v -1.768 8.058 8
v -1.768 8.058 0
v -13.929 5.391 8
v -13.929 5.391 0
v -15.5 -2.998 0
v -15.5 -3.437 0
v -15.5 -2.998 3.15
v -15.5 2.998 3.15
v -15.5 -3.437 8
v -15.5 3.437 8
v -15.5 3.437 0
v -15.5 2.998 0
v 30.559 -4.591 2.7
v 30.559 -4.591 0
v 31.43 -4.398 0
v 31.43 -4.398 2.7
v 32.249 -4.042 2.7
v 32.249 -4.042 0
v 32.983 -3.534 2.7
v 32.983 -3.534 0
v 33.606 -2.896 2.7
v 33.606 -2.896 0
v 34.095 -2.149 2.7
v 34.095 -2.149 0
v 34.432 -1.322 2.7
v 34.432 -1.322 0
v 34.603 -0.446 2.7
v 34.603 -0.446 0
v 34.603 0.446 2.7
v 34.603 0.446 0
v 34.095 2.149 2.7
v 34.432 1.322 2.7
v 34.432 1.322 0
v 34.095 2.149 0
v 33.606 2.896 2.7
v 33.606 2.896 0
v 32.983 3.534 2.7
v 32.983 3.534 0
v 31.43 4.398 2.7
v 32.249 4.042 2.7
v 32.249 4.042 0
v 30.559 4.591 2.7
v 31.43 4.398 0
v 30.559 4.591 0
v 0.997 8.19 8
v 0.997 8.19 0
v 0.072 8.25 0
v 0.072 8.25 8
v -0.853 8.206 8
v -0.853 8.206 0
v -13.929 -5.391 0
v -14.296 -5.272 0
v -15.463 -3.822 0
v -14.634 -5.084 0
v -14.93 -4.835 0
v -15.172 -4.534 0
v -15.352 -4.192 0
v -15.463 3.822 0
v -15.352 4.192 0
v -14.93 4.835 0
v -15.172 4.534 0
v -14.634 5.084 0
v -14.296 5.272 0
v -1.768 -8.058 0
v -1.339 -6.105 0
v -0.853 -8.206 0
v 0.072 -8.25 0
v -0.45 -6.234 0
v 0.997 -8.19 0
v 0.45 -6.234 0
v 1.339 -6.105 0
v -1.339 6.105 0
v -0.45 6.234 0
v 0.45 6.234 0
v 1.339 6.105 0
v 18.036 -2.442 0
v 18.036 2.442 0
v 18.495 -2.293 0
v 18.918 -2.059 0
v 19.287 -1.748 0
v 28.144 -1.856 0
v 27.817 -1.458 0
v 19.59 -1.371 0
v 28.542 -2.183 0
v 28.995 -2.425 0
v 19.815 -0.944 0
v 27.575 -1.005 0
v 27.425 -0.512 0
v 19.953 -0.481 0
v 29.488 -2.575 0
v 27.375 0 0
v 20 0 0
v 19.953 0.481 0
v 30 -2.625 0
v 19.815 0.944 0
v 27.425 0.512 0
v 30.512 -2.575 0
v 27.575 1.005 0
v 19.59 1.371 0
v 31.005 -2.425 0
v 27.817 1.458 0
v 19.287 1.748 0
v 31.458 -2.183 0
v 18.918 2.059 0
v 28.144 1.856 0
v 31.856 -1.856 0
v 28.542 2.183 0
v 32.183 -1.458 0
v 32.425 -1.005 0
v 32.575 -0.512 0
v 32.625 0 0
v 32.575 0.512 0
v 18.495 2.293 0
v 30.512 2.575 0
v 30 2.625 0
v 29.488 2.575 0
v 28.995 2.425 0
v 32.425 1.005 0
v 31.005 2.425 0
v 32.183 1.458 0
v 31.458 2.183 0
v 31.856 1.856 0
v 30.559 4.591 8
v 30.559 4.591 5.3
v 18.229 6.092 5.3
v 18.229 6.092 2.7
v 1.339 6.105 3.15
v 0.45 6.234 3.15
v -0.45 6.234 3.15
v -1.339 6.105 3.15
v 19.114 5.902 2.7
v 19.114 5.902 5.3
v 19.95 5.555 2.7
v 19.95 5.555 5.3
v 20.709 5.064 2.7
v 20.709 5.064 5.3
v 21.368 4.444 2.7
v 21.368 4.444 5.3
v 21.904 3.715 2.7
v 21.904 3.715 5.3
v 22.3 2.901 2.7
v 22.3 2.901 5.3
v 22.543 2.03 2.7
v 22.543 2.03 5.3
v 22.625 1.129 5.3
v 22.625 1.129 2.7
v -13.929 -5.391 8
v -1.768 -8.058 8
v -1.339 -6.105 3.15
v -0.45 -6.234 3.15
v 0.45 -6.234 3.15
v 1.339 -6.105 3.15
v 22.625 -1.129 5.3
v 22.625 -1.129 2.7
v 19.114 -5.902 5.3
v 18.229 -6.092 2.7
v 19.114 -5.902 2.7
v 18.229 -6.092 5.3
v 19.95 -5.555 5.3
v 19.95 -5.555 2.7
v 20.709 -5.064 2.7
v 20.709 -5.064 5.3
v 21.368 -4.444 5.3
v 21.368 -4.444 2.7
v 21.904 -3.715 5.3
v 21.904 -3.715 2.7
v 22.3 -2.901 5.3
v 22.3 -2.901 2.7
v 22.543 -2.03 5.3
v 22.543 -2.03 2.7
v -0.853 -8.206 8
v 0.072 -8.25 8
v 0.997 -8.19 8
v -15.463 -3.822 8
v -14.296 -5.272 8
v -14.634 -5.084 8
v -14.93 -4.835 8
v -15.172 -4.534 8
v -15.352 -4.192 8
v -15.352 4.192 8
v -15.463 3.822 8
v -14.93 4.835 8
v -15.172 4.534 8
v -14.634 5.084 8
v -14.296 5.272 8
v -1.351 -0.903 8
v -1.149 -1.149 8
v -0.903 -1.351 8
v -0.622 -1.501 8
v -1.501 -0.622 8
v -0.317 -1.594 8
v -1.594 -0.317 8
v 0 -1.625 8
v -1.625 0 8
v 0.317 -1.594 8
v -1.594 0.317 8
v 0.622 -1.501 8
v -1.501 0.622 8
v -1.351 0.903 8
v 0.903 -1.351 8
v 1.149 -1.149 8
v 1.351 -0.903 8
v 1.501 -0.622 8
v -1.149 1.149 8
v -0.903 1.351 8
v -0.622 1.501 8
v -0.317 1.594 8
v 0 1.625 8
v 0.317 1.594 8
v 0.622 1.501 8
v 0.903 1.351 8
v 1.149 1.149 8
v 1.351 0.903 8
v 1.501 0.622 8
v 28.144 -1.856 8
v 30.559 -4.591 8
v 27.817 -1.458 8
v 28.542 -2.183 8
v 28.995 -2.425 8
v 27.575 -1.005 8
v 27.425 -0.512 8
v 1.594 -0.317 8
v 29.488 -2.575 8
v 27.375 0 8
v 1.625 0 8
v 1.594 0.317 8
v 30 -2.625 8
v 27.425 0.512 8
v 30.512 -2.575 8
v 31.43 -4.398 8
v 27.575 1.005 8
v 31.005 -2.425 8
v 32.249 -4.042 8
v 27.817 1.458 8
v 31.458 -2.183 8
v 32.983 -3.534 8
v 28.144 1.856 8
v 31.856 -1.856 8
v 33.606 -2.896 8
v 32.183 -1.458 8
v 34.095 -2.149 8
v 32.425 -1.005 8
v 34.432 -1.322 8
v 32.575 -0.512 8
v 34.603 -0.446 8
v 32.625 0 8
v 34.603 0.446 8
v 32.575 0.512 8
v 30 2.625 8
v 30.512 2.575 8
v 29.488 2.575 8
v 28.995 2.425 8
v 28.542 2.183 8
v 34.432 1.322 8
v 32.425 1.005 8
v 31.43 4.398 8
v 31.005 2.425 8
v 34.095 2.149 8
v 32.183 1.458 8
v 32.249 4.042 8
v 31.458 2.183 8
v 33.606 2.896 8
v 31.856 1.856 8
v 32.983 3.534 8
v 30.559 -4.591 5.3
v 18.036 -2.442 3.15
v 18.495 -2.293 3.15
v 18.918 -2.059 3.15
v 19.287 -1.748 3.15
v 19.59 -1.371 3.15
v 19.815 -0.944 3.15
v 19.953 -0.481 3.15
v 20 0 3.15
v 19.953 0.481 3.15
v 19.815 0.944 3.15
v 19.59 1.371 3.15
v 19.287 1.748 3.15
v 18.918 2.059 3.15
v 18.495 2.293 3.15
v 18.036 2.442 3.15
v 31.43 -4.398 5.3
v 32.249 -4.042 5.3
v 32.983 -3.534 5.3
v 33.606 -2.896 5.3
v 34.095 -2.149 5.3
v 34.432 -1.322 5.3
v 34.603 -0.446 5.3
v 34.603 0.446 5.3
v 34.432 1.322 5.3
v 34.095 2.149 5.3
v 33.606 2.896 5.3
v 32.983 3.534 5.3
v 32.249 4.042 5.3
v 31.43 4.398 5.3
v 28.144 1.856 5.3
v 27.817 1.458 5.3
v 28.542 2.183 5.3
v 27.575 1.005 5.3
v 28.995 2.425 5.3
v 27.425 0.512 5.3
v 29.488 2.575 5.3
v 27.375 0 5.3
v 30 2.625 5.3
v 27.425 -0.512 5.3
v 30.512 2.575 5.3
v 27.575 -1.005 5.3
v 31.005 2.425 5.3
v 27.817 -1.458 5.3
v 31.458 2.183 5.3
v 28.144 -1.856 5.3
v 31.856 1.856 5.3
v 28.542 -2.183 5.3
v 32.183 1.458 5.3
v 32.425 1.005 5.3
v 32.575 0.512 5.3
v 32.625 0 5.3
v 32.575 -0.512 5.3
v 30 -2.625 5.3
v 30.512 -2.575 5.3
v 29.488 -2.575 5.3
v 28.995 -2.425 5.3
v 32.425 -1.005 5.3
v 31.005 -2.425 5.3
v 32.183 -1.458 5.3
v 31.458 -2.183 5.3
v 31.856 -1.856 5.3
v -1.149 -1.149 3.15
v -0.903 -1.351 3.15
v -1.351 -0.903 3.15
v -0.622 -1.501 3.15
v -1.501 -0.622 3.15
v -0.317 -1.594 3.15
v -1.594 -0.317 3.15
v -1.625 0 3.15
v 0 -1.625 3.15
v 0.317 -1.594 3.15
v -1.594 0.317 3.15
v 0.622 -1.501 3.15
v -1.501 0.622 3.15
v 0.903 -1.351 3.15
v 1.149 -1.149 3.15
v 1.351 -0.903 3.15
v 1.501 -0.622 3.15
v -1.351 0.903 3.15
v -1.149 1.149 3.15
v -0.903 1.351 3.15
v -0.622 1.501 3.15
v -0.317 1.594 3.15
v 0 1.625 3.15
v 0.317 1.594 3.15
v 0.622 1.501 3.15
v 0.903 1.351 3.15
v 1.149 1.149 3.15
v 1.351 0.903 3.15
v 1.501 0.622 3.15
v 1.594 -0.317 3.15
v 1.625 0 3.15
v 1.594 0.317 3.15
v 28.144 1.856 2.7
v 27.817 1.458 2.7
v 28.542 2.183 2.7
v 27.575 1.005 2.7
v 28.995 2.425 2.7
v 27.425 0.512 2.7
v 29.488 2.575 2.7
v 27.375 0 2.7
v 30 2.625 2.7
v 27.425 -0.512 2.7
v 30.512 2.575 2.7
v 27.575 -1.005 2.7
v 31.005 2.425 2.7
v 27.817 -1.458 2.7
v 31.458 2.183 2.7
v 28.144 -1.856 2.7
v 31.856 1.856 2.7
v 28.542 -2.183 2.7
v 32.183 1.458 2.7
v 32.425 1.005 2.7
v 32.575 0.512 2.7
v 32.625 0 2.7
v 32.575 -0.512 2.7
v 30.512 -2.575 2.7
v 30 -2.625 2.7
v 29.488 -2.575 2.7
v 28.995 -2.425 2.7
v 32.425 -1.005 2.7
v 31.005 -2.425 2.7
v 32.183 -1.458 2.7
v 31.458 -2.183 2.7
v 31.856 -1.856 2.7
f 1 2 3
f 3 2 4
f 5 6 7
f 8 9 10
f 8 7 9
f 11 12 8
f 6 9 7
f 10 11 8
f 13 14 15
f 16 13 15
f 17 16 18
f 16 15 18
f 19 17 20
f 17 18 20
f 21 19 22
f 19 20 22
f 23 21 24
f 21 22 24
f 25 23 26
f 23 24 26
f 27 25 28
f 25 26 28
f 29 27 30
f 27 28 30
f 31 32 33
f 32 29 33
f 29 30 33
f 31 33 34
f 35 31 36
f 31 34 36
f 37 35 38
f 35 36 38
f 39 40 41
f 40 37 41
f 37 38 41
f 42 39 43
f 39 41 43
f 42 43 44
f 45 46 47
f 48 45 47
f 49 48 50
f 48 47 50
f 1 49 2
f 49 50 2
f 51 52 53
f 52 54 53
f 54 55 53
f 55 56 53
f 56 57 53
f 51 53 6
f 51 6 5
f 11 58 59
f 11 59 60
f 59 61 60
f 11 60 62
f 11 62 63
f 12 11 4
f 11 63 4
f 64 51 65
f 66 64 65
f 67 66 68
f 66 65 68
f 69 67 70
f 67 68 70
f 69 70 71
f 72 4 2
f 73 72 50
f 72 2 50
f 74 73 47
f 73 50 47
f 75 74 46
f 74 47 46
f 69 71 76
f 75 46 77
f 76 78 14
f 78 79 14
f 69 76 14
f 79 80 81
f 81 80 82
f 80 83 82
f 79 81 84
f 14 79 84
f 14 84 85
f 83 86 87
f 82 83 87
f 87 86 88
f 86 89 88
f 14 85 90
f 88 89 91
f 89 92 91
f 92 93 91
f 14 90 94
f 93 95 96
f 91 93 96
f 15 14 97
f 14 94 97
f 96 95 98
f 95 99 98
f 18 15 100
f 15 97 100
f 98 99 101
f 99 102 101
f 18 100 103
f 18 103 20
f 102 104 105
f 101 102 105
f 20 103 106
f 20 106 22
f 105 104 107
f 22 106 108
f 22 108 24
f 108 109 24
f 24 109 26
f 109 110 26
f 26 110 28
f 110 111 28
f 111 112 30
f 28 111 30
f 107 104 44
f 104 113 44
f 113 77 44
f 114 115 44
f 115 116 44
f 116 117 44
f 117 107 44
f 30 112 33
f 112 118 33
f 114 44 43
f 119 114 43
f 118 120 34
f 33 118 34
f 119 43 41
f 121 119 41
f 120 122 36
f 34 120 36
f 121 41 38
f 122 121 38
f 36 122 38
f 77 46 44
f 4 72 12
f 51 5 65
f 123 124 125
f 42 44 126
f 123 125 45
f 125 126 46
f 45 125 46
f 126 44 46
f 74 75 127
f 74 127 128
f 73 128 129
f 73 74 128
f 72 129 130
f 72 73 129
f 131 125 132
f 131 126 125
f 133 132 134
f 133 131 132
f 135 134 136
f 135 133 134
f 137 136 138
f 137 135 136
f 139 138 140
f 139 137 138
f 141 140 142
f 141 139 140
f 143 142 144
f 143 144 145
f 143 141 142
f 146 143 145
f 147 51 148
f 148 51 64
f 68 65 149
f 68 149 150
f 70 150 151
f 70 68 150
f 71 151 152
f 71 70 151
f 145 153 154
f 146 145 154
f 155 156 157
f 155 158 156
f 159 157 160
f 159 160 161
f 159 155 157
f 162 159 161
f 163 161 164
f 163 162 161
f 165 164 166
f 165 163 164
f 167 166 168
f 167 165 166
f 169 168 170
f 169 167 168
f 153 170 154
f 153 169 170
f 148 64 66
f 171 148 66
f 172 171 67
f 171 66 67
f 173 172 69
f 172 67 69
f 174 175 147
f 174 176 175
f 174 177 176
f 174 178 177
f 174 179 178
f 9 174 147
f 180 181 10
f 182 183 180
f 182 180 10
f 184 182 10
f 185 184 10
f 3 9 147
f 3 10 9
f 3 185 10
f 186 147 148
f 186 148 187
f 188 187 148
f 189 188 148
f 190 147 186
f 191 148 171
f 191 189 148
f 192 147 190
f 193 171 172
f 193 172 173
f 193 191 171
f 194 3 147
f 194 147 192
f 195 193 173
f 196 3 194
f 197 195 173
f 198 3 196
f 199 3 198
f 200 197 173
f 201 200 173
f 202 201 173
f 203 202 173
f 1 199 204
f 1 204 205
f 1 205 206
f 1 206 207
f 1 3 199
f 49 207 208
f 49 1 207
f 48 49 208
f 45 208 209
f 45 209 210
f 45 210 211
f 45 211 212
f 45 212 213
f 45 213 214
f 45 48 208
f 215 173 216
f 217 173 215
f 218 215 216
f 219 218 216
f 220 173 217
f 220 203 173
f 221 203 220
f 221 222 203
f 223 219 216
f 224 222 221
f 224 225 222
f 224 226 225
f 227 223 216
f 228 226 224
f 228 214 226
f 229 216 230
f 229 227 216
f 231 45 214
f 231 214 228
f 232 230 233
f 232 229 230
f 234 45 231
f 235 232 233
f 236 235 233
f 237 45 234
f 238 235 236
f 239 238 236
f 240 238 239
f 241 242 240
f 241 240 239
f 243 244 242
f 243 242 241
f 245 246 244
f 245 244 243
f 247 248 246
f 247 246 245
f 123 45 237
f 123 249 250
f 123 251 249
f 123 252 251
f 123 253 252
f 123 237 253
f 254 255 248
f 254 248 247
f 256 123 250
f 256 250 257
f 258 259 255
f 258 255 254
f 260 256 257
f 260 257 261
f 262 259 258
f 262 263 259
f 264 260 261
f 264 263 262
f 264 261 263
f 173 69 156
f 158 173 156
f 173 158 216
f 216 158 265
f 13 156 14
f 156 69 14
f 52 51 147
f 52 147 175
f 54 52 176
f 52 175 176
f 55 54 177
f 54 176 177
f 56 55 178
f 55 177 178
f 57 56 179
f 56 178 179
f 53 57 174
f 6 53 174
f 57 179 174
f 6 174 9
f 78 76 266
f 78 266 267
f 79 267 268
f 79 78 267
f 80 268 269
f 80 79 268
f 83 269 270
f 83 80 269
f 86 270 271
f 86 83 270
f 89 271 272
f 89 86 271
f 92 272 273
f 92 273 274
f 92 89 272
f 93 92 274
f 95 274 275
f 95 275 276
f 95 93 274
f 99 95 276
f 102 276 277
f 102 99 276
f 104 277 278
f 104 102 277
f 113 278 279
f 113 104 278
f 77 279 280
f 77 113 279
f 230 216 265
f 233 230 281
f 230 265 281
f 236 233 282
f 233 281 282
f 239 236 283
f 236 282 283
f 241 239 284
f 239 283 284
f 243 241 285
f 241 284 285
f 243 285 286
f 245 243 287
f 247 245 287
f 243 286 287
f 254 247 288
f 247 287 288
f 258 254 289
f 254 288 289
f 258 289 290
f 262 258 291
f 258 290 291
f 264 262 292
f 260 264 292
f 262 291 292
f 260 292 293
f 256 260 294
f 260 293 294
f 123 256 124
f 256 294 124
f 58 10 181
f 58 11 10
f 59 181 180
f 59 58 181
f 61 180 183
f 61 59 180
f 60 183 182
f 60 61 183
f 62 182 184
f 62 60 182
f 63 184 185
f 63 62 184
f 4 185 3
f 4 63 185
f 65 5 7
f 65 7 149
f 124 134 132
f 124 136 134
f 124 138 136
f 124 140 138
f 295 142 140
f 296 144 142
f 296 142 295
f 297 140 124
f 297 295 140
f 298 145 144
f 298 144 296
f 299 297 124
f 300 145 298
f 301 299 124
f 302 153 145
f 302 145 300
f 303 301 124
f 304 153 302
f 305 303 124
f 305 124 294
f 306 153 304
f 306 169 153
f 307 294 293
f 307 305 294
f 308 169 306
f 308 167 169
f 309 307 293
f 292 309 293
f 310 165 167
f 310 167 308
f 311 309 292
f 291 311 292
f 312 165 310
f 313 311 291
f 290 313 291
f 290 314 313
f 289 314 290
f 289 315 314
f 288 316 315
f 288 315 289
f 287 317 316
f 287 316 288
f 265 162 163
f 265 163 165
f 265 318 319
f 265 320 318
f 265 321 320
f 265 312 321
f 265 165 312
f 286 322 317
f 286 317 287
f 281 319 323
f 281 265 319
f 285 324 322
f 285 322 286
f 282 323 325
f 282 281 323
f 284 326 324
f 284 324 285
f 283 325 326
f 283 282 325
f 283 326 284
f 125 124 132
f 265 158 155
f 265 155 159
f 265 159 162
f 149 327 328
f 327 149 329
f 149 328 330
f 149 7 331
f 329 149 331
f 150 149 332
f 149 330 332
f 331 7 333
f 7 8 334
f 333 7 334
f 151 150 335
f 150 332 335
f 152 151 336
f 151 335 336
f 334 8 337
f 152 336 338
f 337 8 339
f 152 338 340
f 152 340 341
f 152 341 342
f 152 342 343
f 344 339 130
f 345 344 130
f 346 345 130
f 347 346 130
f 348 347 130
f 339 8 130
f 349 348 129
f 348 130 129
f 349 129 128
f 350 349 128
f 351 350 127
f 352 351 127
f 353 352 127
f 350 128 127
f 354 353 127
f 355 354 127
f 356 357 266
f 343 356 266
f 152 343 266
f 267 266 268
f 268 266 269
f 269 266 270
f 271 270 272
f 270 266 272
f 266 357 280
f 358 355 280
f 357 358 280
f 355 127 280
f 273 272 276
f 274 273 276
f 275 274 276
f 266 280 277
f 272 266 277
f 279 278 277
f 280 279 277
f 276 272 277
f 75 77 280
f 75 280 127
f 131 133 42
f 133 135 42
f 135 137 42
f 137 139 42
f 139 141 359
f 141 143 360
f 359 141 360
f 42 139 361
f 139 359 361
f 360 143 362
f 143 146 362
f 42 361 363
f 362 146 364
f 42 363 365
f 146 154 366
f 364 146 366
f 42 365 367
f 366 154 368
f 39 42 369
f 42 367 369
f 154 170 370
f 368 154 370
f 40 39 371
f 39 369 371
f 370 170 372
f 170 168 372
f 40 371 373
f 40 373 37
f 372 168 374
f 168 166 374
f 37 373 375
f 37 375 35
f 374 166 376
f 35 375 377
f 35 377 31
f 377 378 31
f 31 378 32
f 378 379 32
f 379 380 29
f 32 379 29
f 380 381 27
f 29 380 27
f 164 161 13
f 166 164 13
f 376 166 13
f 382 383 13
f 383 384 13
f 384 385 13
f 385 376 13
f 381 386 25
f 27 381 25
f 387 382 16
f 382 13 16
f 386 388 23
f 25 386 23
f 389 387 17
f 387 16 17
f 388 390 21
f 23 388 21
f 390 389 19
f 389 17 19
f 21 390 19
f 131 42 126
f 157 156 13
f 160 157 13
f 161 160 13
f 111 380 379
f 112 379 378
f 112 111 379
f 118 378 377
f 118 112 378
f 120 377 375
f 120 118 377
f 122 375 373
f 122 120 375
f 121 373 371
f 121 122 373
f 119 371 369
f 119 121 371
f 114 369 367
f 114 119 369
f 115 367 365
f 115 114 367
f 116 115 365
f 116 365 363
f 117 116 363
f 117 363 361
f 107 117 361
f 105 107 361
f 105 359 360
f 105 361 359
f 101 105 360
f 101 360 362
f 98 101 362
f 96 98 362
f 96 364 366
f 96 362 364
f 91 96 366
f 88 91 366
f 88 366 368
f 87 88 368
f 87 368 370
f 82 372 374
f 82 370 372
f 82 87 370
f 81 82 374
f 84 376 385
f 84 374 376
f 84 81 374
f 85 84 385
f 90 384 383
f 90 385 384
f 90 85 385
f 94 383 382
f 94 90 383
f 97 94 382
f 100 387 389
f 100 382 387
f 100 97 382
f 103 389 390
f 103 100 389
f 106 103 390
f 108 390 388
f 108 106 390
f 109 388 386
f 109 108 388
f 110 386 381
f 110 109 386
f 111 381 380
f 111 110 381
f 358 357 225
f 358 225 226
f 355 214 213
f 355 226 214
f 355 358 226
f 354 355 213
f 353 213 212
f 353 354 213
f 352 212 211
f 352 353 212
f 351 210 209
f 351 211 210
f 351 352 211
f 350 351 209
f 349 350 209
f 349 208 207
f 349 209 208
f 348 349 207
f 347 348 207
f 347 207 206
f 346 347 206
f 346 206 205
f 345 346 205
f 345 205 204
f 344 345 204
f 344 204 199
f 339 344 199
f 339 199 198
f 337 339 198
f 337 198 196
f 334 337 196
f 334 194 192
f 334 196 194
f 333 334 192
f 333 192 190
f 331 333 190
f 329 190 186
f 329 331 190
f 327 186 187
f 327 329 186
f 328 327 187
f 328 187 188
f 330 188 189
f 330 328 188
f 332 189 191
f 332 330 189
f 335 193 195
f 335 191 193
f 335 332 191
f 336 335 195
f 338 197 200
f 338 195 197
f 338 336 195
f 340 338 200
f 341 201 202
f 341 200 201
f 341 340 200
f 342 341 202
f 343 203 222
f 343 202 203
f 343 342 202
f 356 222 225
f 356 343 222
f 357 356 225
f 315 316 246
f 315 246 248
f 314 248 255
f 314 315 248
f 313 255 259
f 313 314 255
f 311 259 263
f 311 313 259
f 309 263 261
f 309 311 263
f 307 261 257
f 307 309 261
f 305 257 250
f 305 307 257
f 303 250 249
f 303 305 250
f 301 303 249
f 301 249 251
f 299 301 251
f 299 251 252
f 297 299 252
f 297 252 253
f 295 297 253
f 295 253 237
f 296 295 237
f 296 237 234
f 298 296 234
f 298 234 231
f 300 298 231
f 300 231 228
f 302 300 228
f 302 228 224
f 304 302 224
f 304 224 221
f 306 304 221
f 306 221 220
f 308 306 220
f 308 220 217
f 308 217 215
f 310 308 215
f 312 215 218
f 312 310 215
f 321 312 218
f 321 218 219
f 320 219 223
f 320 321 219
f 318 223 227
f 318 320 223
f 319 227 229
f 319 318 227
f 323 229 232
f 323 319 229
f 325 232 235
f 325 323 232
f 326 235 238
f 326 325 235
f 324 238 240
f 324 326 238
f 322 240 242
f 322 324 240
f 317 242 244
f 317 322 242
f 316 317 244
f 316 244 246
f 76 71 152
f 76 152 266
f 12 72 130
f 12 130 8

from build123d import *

# Parameters (mm, degrees)
SKETCH2_R               = 2.625
BOSS_EXTRUDE2_DEPTH     = 8
CUT_EXTRUDE5_DEPTH      = 3.15
CUT_EXTRUDE6_DEPTH      = 37.482230264
CUT_EXTRUDE6_DEPTH_BACK = 37.482230264
SKETCH6_W               = 24
SKETCH6_H               = 2.6
FILLET1_R               = 5
CUT_EXTRUDE7_DEPTH      = 37.482230264
CUT_EXTRUDE7_DEPTH_BACK = 37.482230264
SKETCH1_7_R             = 1.625
SKETCH7_W               = 26.970959806
SKETCH7_H               = 23.004642188
CUT_EXTRUDE8_DEPTH      = 37.482230264
FILLET2_R               = 2


with BuildPart() as part:
    # Sketch2 → Boss-Extrude2 (new body)
    with BuildSketch(Plane.XY):
        with BuildLine():
            Line((-1.767857143, 8.058360945), (-18.464285714, 4.395469606))
            ThreePointArc((-18.464285714, 4.395469606), (-22, 0), (-18.464285714, -4.395469606))
            Line((-18.464285714, -4.395469606), (-1.767857143, -8.058360945))
            ThreePointArc((-1.767857143, -8.058360945), (-0.391032035, -8.240727756), (0.996875, -8.189550674))
            Line((0.996875, -8.189550674), (30.558854167, -4.591111741))
            ThreePointArc((30.558854167, -4.591111741), (34.625, 0), (30.558854167, 4.591111741))
            Line((30.558854167, 4.591111741), (0.996875, 8.189550674))
            ThreePointArc((0.996875, 8.189550674), (-0.391032035, 8.240727756), (-1.767857143, 8.058360945))
        make_face()
        with Locations((30, 0)):
            Circle(SKETCH2_R, mode=Mode.SUBTRACT)
    extrude(amount=BOSS_EXTRUDE2_DEPTH)

    # Sketch1 → Cut-Extrude5 (cut)
    with BuildSketch(Plane.XY):
        with BuildLine():
            Line((-1.339285714, 6.104818898), (-18.035714286, 2.441927559))
            ThreePointArc((-18.035714286, 2.441927559), (-20, 0), (-18.035714286, -2.441927559))
            Line((-18.035714286, -2.441927559), (-1.339285714, -6.104818898))
            ThreePointArc((-1.339285714, -6.104818898), (0, -6.25), (1.339285714, -6.104818898))
            Line((1.339285714, -6.104818898), (18.035714286, -2.441927559))
            ThreePointArc((18.035714286, -2.441927559), (20, 0), (18.035714286, 2.441927559))
            Line((18.035714286, 2.441927559), (1.339285714, 6.104818898))
            ThreePointArc((1.339285714, 6.104818898), (0, 6.25), (-1.339285714, 6.104818898))
        make_face()
    extrude(amount=CUT_EXTRUDE5_DEPTH, mode=Mode.SUBTRACT)

    # Sketch6 → Cut-Extrude6 (cut, two sides: drawn at the far end of the back side and taken through both)
    with BuildSketch(Plane(origin=(0, 0, 0), x_dir=(1, 0, 0), z_dir=(0, 1, 0)).offset(-CUT_EXTRUDE6_DEPTH_BACK)):
        with Locations((34.625, -4)):
            Rectangle(SKETCH6_W, SKETCH6_H)
    extrude(amount=CUT_EXTRUDE6_DEPTH + CUT_EXTRUDE6_DEPTH_BACK, mode=Mode.SUBTRACT)

    # Fillet1
    fillet1_edges = [part.edges().sort_by_distance(p)[0] for p in [
        (22.625, 5.556862023, 4),
        (22.625, -5.556862023, 4),
    ]]
    fillet(fillet1_edges, radius=FILLET1_R)

    # Sketch1<7> → Cut-Extrude7 (cut, two sides: drawn at the far end of the back side and taken through both)
    with BuildSketch(Plane.XY.offset(-CUT_EXTRUDE7_DEPTH_BACK)):
        Circle(SKETCH1_7_R)
    extrude(amount=CUT_EXTRUDE7_DEPTH + CUT_EXTRUDE7_DEPTH_BACK, mode=Mode.SUBTRACT)

    # Sketch7 → Cut-Extrude8 (cut, through all)
    with BuildSketch(Plane.XY):
        with Locations((-28.985479903, 0)):
            Rectangle(SKETCH7_W, SKETCH7_H)
    extrude(amount=CUT_EXTRUDE8_DEPTH, mode=Mode.SUBTRACT)

    # Fillet2
    fillet2_edges = [part.edges().sort_by_distance(p)[0] for p in [
        (-15.5, -5.045779726, 4),
        (-15.5, 5.045779726, 4),
    ]]
    fillet(fillet2_edges, radius=FILLET2_R)


solid = part.part
